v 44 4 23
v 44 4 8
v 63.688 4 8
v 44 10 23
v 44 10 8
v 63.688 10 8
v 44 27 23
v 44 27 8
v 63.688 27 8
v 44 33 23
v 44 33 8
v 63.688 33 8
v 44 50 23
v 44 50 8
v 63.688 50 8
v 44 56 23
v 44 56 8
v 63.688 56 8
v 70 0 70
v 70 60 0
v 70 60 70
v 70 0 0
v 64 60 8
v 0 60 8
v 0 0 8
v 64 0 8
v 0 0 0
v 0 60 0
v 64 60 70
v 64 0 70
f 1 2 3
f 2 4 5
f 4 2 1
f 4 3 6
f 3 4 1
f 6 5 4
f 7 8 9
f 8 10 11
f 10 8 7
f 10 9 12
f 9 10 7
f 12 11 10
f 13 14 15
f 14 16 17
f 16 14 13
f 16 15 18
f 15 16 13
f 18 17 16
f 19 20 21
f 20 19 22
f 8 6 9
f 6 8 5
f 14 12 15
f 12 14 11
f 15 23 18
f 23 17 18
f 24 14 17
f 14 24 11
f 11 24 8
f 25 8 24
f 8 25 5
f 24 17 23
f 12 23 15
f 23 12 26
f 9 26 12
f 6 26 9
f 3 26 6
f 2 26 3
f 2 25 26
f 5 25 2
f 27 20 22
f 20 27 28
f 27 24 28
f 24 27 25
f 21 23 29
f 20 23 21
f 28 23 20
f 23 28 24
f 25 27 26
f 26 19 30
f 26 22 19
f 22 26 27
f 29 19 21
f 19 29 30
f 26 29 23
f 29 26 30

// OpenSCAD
$fn = 32;

// ----------------------------------------------------------------------
// Rib bracket: 3-gusset L bracket
// ----------------------------------------------------------------------

// --- parameters (mm) ---
base_l = 70;              // foot length, X
base_w = 60;              // foot width, Y
base_t = 8;               // foot thickness
plate_t = 6;              // upright plate thickness
plate_h = 70;             // overall height
gus_l = 20;               // gusset leg along the foot
gus_h = 16;               // gusset height
gus_t = 6;                // gusset thickness
gus_edge = 4;             // gusset margin from the foot edge
n_gus = 3;                // gusset count

gus_pitch = (base_w - 2 * gus_edge - gus_t) / (n_gus - 1);  // gusset pitch

union() {
  cube([base_l, base_w, base_t]);
  translate([base_l - plate_t, 0, base_t - 1])
    cube([plate_t, base_w, plate_h - base_t + 1]);
  for (i = [0 : n_gus - 1])
    translate([base_l - plate_t - gus_l, gus_edge + i * gus_pitch, base_t - 1])
      rotate([-90, 0, 0])
        linear_extrude(height = gus_t)
          polygon(points = [[0, 0], [gus_l + 1, 0], [0, -gus_h]]);
}
